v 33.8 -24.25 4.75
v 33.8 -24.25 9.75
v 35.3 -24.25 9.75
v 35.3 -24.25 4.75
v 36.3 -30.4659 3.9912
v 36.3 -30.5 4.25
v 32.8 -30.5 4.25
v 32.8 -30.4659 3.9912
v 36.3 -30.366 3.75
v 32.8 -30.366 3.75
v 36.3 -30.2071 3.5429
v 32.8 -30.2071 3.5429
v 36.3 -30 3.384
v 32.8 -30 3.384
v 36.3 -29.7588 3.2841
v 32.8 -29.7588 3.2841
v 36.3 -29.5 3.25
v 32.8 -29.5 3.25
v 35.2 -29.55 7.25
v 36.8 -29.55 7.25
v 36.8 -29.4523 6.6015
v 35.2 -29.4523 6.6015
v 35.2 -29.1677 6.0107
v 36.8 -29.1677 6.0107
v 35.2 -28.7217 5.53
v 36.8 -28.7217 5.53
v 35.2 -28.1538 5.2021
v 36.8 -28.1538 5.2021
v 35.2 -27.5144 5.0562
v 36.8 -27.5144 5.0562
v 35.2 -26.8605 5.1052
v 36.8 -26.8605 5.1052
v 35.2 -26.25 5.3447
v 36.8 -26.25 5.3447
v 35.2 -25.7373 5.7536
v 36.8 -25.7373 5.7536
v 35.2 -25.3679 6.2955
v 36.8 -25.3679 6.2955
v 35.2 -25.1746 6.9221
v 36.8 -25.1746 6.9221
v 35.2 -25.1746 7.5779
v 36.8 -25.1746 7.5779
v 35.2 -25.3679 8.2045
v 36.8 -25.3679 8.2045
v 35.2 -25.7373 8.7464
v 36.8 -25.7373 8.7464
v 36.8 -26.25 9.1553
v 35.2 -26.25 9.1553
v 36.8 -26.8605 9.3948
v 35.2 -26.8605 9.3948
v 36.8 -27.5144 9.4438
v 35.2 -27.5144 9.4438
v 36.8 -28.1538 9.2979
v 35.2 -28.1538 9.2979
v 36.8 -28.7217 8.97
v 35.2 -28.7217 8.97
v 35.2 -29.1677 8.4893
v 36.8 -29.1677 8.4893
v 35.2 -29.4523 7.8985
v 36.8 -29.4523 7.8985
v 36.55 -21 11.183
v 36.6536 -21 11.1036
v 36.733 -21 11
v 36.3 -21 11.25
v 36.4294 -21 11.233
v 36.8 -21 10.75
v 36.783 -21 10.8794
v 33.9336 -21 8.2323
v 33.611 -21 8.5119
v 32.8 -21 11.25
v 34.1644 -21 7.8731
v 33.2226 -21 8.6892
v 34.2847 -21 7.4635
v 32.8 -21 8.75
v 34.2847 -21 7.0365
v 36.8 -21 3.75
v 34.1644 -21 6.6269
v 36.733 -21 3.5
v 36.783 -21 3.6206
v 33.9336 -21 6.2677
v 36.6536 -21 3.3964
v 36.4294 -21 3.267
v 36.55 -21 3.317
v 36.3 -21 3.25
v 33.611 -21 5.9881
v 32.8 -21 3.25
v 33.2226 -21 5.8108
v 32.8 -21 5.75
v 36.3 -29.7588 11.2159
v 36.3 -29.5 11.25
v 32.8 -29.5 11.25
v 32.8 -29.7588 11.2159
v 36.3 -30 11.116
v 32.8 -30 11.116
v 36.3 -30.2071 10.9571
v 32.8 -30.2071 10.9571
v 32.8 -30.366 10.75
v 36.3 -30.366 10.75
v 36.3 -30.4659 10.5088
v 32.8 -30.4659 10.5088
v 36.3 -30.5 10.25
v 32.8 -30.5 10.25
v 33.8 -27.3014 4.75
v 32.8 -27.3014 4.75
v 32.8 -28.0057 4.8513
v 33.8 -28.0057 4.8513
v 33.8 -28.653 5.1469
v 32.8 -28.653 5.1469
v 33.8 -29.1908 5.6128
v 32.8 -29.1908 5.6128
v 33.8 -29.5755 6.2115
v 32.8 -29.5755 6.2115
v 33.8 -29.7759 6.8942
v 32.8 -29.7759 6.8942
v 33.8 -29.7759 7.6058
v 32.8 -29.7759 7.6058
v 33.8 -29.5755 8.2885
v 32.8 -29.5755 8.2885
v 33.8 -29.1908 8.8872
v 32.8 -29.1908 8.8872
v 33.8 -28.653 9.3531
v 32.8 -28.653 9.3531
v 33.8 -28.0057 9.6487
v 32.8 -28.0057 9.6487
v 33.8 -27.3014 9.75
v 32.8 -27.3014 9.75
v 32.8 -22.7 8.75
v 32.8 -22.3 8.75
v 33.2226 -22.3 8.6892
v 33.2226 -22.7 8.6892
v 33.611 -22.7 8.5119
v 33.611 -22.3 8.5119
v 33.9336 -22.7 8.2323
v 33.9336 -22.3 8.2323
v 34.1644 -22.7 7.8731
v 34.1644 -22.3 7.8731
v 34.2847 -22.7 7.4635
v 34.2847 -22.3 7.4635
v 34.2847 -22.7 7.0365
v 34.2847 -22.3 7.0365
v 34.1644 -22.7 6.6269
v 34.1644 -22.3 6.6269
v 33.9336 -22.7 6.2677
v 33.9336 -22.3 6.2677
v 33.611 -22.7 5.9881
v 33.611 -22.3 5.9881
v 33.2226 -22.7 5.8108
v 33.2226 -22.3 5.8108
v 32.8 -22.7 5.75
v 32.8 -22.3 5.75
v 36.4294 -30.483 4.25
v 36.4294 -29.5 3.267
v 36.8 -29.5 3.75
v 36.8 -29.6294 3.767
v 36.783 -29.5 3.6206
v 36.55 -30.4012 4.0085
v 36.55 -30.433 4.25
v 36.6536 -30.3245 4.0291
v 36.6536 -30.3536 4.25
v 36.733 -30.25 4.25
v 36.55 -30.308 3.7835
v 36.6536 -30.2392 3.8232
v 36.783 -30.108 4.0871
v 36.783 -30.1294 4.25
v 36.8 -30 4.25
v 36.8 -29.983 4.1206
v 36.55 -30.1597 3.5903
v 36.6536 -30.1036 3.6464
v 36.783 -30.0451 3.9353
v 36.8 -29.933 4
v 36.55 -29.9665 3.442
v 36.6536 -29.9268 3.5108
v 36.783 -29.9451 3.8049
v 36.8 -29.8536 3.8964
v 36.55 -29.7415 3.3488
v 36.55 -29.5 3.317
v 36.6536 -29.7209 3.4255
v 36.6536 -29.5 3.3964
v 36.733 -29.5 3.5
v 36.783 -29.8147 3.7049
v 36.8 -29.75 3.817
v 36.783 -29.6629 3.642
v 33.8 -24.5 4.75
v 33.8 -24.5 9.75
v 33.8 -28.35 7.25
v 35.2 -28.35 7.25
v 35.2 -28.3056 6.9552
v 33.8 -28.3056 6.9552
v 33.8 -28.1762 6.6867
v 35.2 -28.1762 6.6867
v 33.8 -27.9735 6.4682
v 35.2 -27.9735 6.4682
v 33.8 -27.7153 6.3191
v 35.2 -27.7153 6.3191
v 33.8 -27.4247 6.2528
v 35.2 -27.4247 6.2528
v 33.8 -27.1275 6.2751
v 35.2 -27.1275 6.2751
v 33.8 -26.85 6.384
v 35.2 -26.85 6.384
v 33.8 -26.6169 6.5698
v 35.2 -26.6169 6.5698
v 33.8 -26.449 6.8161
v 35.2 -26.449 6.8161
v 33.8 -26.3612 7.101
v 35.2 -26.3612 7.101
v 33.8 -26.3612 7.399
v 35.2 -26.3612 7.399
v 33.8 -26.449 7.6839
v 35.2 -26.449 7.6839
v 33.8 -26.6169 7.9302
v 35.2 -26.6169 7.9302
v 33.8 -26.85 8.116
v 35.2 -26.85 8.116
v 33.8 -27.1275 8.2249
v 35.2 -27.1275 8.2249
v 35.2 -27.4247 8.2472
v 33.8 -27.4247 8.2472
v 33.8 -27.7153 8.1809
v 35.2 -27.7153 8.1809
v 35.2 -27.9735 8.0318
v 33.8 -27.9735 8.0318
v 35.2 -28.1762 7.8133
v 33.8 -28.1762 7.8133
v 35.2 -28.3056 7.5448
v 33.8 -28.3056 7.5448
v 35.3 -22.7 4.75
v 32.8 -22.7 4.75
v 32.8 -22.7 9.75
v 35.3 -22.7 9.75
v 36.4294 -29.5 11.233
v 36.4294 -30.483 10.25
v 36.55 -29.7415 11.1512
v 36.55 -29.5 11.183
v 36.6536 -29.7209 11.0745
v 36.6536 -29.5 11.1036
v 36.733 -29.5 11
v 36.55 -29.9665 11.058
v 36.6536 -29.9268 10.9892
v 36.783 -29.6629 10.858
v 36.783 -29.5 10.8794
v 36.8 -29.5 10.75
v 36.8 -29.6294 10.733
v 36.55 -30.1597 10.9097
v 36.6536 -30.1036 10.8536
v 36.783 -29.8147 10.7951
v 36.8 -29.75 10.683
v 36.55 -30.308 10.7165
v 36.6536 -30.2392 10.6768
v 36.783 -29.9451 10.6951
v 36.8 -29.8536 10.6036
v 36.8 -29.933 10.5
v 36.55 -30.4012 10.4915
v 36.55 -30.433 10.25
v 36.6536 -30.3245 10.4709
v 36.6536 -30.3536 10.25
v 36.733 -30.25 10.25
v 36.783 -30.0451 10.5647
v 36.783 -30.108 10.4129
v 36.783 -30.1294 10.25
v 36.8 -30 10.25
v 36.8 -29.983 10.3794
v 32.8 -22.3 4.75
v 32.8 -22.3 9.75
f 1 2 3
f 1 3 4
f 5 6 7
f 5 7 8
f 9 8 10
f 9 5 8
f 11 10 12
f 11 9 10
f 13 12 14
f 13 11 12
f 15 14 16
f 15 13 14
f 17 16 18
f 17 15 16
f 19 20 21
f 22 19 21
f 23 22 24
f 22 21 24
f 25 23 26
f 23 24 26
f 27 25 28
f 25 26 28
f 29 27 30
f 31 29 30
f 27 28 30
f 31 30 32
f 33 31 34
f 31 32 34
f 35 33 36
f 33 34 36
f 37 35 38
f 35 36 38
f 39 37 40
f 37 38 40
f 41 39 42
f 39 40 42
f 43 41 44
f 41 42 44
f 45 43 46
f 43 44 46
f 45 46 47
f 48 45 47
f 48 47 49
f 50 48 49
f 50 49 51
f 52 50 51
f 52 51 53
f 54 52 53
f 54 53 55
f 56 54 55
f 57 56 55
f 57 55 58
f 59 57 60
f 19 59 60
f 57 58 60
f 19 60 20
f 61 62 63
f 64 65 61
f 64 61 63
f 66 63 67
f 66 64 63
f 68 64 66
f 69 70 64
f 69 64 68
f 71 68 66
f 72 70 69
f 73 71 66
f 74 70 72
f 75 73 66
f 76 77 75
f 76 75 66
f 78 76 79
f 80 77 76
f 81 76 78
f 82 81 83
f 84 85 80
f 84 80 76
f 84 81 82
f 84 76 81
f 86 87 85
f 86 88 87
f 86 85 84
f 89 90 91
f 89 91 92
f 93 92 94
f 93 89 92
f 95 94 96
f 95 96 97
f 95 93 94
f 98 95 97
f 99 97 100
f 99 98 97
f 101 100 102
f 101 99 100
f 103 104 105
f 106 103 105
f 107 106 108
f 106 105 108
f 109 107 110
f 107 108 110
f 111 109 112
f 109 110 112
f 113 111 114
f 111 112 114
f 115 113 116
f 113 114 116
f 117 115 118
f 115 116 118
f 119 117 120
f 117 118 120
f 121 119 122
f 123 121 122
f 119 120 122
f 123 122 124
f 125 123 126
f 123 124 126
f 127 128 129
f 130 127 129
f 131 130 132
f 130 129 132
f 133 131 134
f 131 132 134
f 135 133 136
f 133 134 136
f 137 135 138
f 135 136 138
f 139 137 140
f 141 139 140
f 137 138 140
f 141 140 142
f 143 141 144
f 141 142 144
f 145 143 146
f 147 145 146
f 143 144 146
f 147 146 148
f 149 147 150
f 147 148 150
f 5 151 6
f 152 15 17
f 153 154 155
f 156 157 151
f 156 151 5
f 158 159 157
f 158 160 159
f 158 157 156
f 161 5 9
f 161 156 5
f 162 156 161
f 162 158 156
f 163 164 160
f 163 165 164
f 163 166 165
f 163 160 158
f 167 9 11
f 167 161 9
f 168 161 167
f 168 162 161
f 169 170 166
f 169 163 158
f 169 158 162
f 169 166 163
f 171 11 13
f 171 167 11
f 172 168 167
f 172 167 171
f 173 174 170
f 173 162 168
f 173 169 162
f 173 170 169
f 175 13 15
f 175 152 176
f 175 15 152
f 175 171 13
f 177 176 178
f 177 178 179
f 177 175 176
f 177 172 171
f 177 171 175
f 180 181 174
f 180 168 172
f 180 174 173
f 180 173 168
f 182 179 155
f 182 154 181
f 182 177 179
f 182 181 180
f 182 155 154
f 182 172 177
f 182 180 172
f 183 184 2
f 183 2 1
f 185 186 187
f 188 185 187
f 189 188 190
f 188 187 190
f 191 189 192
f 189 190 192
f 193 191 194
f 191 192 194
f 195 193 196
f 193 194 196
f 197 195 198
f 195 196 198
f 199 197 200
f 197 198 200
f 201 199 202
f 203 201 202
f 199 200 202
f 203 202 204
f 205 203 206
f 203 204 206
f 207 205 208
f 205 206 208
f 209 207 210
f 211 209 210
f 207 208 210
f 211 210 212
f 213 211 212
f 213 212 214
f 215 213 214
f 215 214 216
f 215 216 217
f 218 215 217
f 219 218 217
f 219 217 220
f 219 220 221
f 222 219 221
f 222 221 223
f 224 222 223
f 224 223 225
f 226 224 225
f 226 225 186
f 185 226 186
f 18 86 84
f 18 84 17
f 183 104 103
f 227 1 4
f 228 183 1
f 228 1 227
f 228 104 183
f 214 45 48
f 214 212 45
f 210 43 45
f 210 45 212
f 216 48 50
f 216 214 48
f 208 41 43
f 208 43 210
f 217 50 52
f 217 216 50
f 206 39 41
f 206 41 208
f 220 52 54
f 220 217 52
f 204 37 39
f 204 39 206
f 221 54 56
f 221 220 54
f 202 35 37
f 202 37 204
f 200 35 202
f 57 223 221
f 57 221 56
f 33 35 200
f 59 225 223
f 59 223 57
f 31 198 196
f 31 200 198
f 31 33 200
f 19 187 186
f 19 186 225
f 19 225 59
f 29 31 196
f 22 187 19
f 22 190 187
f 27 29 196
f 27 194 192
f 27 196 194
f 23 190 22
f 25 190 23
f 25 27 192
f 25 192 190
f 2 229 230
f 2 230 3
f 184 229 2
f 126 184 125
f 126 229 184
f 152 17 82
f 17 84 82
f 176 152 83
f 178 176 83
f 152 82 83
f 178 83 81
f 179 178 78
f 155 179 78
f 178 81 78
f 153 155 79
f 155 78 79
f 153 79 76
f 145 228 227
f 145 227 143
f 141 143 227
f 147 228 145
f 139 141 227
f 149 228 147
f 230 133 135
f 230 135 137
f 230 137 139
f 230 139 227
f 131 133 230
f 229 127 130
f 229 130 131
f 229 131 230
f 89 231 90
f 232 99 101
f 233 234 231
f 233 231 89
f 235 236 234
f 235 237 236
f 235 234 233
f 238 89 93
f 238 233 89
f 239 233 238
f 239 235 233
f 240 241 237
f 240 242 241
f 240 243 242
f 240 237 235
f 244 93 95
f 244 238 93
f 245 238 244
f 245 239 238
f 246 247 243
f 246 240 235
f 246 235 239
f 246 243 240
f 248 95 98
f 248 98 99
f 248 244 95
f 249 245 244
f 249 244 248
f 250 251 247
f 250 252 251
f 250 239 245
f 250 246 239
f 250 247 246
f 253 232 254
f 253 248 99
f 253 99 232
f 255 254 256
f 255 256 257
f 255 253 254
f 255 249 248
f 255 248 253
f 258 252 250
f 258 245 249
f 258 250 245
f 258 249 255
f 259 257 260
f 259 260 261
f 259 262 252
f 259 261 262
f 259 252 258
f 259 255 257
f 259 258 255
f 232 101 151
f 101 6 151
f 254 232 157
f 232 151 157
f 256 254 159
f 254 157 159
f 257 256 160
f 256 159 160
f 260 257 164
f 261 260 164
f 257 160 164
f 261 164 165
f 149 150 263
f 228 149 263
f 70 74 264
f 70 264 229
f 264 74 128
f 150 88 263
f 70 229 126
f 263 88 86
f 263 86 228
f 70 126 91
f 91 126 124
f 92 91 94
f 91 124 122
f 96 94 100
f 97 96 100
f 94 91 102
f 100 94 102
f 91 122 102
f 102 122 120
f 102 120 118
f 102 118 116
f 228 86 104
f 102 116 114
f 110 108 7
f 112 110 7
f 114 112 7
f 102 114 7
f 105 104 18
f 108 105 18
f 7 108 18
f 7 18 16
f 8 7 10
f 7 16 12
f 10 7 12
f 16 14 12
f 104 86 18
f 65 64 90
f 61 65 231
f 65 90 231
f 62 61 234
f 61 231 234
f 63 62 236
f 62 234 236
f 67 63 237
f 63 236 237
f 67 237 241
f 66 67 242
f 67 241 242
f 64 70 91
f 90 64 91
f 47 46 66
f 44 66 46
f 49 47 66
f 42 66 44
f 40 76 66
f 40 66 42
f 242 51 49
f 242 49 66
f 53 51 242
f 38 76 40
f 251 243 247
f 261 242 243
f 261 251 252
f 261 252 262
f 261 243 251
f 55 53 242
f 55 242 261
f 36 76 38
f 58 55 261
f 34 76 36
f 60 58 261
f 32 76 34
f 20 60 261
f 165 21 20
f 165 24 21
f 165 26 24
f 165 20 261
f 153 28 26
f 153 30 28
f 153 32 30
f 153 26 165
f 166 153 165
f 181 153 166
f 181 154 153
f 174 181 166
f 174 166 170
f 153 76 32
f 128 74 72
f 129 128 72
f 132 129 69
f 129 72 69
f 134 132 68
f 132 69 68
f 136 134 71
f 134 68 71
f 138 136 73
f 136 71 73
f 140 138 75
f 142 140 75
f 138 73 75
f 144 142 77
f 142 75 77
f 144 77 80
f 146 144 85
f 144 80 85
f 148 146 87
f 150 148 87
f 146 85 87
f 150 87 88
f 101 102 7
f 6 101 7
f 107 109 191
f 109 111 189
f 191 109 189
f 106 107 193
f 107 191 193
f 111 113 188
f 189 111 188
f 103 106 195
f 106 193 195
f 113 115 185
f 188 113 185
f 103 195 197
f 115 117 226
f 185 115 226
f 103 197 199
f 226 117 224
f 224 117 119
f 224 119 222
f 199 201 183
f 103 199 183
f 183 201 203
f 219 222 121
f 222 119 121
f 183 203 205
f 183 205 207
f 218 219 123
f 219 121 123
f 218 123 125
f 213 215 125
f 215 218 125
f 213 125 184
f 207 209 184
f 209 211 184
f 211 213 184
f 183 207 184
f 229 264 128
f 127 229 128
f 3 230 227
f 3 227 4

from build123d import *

# Parameters (mm, degrees)
SKETCH067_W             = 9.5
SKETCH067_H             = 8
PAD034_DEPTH            = 4
FILLET019_R             = 1
SKETCH068_R             = 2.2
POCKET033_DEPTH         = 1.6
SKETCH069_R             = 1
POCKET034_DEPTH         = 3
POCKET038_DEPTH         = 1
SKETCH072_W             = 2.2
SKETCH072_H             = 5
POCKET039_DEPTH         = 1.5
SKETCH074_R             = 1.5
POCKET041_DEPTH         = 1.3
FILLET023_R             = 0.5
PAD195_DEPTH            = 0.4
PAD195_FACE6_W          = 5
PAD195_FACE6_H          = 1.5
PAD196_DEPTH            = 0.25
BODY007_ROLL_ANGLE      = -90
BODY007_PLACEMENT_ANGLE = -90


with BuildPart() as part:
    # Sketch067 → Pad034 (new body)
    with BuildSketch(Plane.XY):
        with Locations((-4.75, 0)):
            Rectangle(SKETCH067_W, SKETCH067_H)
    extrude(amount=PAD034_DEPTH)

    # Fillet019
    fillet019_edges = [part.edges().sort_by_distance(p)[0] for p in [
        (0, 4, 2),
        (0, -4, 2),
    ]]
    fillet(fillet019_edges, radius=FILLET019_R)

    # Sketch068 (on Face5 of Fillet019) → Pocket033 (cut)
    with BuildSketch(Plane.XY.offset(4)):
        with Locations((-3.15, 0)):
            Circle(SKETCH068_R)
    extrude(amount=-POCKET033_DEPTH, mode=Mode.SUBTRACT)

    # Sketch069 (on Face10 of Pocket033) → Pocket034 (cut)
    with BuildSketch(Plane.XY.offset(2.4)):
        with Locations((-3.15, 0)):
            Circle(SKETCH069_R)
    extrude(amount=-POCKET034_DEPTH, mode=Mode.SUBTRACT)

    # Sketch071 (on DatumPlane) → Pocket038 (cut)
    with BuildSketch(Plane(origin=(0, 0, 0), x_dir=(1, 0, 0), z_dir=(0, 0, -1))):
        with BuildLine():
            Line((-8.2, 2.5), (-3.198621, 2.5))
            ThreePointArc((-3.198621, -2.5), (-0.698621, 0), (-3.198621, 2.5))
            Line((-3.198621, -2.5), (-8.2, -2.5))
            Line((-8.2, -2.5), (-8.2, 2.5))
        make_face()
    extrude(amount=-POCKET038_DEPTH, mode=Mode.SUBTRACT)

    # Sketch072 (on DatumPlane) → Pocket039 (cut)
    with BuildSketch(Plane(origin=(0, 0, 1), x_dir=(1, 0, 0), z_dir=(0, 0, -1))):
        with Locations((-7.1, 0)):
            Rectangle(SKETCH072_W, SKETCH072_H)
    extrude(amount=-POCKET039_DEPTH, mode=Mode.SUBTRACT)

    # Sketch074 (on DatumPlane) → Pocket041 (cut)
    with BuildSketch(Plane(origin=(-9.5, 0, 0), x_dir=(0, -1, 0), z_dir=(-1, 0, 0))):
        Circle(SKETCH074_R)
    extrude(amount=-POCKET041_DEPTH, mode=Mode.SUBTRACT)

    # Fillet023
    fillet023_edges = [part.edges().sort_by_distance(p)[0] for p in [
        (-5.25, -4, 4),
        (-0.292893, -3.707107, 4),
        (0, 0, 4),
        (-0.292893, 3.707107, 4),
        (-5.25, 4, 4),
    ]]
    fillet(fillet023_edges, radius=FILLET023_R)

    # Fillet023 Face12 → Pad195 (add)
    with BuildSketch(Plane(origin=(-8.2, 0, 1.491795), x_dir=(0, -1, 0), z_dir=(1, 0, 0))):
        with BuildLine():
            Line((-1.5, 1.491795), (-2.5, 1.491795))
            Line((-2.5, 1.491795), (-2.5, -1.008205))
            Line((-2.5, -1.008205), (2.5, -1.008205))
            Line((2.5, -1.008205), (2.5, 1.491795))
            Line((2.5, 1.491795), (1.5, 1.491795))
            ThreePointArc((1.5, 1.491795), (0, -0.008205), (-1.5, 1.491795))
        make_face()
    extrude(amount=PAD195_DEPTH)

    # Pad195 Face6 → Pad196 (add)
    with BuildSketch(Plane(origin=(-6, 0, 1.75), x_dir=(0, 1, 0), z_dir=(-1, 0, 0))):
        Rectangle(PAD195_FACE6_W, PAD195_FACE6_H)
    extrude(amount=PAD196_DEPTH)


with BuildPart() as part_1:
    # Body007 roll: moved
    add(part.part.rotate(Axis((0, 0, 0), (1, 0, 0)), BODY007_ROLL_ANGLE))


with BuildPart() as part_2:
    # Body007 placement: moved
    add(part_1.part.moved(Location((32.8, -30.5, 7.25))).rotate(Axis((32.8, -30.5, 7.25), (0, 0, 1)), BODY007_PLACEMENT_ANGLE))


solid = part_2.part
